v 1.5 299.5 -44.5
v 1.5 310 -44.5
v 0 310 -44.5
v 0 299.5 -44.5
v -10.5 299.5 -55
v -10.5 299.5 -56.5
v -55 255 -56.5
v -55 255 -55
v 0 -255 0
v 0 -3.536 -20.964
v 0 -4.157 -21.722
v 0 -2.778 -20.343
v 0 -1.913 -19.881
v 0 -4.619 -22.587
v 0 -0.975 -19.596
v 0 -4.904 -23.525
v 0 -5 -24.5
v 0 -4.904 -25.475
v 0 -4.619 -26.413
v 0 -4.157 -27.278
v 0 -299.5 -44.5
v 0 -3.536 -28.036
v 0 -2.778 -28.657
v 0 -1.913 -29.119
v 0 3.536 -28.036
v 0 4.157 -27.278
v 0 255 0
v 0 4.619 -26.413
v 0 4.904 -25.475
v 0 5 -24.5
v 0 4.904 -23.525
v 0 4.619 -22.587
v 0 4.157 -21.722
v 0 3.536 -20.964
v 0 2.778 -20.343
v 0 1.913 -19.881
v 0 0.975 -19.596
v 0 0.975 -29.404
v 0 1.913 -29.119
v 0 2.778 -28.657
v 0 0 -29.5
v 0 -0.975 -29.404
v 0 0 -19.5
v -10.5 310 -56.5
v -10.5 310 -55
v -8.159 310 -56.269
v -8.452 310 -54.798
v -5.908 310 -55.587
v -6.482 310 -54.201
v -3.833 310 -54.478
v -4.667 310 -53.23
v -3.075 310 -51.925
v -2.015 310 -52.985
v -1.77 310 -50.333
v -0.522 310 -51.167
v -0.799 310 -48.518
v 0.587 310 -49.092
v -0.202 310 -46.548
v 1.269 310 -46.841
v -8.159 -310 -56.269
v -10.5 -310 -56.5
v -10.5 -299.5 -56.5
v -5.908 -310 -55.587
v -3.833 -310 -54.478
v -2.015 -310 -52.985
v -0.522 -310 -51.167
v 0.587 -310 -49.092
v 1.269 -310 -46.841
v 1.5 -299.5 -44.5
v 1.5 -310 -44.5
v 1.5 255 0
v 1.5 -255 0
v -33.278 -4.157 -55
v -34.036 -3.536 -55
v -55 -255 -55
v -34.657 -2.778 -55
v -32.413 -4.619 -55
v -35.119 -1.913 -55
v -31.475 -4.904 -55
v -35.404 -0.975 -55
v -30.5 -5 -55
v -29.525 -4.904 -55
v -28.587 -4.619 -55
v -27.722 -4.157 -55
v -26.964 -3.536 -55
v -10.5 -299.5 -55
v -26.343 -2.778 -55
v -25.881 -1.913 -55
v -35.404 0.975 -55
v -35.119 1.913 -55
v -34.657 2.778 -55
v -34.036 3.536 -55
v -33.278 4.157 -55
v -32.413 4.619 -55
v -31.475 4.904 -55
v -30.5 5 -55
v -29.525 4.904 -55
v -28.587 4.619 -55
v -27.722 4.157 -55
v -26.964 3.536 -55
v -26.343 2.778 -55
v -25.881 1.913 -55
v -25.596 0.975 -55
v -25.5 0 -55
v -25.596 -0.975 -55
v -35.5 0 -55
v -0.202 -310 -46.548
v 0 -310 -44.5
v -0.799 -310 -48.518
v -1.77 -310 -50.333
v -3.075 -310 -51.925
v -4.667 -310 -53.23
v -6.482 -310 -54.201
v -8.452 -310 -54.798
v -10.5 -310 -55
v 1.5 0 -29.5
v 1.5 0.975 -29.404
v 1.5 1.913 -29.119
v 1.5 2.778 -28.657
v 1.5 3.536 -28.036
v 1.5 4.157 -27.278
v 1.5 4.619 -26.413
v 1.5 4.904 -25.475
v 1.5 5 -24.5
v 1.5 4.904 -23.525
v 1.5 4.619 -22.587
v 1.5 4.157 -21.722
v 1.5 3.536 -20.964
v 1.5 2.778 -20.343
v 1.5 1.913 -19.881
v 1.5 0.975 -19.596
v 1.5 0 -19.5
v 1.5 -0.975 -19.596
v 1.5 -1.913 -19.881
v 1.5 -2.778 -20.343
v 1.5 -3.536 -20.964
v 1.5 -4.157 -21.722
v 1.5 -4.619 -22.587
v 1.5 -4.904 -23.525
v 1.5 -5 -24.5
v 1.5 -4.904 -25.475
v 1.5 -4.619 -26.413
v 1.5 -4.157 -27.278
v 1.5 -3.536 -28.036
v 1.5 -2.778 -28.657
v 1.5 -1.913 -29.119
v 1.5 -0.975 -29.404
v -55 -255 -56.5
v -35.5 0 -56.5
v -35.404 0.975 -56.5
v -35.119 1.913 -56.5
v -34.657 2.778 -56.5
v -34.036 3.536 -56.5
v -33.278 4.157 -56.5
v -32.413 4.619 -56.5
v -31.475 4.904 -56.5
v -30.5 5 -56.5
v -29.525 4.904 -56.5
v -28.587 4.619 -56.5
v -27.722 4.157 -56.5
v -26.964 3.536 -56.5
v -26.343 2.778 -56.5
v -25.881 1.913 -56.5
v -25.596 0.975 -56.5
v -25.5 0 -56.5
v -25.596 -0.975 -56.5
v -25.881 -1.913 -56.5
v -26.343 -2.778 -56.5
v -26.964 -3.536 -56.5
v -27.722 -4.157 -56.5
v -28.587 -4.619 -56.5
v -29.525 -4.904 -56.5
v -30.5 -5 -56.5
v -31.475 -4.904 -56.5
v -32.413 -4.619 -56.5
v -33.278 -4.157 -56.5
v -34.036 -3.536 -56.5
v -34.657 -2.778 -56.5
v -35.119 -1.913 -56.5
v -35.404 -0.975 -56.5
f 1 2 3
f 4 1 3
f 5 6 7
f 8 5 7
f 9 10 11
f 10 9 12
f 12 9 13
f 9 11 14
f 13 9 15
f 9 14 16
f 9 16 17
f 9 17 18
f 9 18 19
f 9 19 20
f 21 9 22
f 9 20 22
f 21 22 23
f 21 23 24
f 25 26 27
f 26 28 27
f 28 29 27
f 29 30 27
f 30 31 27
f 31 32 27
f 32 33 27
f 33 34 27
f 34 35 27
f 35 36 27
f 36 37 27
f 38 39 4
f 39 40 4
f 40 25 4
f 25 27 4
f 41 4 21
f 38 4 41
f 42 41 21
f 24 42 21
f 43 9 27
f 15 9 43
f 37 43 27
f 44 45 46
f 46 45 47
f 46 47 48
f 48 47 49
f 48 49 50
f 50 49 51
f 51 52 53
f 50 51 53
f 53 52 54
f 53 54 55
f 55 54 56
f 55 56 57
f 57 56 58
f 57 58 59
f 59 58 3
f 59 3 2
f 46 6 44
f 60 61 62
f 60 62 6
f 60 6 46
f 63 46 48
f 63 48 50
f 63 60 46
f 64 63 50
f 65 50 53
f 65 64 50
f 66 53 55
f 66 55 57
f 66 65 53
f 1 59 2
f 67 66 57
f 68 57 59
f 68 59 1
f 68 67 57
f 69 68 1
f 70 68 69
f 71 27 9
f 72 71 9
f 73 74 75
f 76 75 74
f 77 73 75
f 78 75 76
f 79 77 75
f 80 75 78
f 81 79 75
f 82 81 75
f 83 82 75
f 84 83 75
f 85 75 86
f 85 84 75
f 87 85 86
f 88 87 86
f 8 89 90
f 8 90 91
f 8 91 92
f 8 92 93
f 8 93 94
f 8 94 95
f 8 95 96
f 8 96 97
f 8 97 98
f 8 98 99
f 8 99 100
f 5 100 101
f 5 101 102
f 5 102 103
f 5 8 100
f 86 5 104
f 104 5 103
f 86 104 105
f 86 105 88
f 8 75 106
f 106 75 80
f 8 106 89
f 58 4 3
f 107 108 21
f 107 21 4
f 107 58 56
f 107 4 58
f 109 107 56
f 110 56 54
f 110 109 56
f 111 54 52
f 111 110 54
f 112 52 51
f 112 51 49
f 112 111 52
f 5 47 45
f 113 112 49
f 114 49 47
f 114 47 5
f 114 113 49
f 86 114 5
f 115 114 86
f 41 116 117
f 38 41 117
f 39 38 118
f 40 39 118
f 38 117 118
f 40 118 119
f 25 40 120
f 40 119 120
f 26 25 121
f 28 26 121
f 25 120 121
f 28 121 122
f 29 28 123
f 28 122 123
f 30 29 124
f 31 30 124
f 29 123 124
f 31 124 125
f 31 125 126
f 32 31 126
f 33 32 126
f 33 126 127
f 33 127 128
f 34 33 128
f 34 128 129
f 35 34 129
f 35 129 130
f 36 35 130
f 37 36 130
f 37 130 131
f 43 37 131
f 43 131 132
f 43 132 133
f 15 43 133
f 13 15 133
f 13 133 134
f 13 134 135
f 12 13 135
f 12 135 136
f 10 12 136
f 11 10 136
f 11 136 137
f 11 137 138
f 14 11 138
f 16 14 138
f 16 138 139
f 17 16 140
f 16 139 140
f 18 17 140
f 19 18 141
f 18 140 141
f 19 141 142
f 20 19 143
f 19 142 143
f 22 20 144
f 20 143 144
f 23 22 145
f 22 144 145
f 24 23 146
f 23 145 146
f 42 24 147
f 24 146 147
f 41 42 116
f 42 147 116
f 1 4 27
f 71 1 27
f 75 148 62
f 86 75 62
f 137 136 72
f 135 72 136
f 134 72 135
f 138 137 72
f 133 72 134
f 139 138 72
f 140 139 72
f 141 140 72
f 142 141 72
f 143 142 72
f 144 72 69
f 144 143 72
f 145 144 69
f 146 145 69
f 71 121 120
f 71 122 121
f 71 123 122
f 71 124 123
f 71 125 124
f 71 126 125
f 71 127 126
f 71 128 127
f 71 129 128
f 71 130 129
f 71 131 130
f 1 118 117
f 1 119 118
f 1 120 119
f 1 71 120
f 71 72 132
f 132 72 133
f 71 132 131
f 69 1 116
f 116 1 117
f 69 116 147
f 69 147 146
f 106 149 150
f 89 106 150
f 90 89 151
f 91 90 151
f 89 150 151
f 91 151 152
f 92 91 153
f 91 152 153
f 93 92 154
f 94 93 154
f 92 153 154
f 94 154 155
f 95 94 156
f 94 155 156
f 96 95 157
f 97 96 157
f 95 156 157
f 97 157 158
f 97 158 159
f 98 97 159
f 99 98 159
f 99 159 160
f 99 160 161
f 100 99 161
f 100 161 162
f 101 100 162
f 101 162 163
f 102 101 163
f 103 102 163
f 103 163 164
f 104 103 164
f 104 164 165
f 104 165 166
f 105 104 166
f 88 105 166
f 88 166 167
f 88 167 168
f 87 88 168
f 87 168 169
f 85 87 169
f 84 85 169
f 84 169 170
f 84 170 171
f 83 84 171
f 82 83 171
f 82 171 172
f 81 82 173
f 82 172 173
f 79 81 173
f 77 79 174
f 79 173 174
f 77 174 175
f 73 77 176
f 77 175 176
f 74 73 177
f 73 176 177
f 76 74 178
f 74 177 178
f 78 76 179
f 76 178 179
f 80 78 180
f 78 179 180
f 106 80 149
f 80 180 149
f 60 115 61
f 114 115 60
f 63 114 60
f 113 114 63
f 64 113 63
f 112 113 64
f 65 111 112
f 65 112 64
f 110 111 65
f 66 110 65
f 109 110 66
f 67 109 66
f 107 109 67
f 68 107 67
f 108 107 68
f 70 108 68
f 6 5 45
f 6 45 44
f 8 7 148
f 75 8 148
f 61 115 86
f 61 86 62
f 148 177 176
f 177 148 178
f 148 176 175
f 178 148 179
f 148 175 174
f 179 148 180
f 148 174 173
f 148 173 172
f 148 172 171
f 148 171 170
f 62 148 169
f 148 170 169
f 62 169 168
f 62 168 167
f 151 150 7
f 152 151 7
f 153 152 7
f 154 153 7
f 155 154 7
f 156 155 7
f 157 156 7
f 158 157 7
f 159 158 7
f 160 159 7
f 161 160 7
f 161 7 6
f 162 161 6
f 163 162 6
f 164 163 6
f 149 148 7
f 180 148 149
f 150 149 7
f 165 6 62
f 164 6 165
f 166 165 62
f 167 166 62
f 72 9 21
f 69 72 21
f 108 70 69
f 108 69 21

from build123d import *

# Parameters (mm, degrees)
SKETCH1_W               = 1.5
SKETCH1_H               = 620
BOSS_EXTRUDE1_DEPTH     = 1.5
BOSS_EXTRUDE3_DEPTH     = 1.5
SKETCH5_W               = 1.5
SKETCH5_H               = 1.5
CUT_EXTRUDE1_DEPTH      = 1
CUT_EXTRUDE1_DEPTH_BACK = 621
BOSS_EXTRUDE4_DEPTH     = 620
SKETCH6_R               = 5
CUT_EXTRUDE2_DEPTH      = 1
CUT_EXTRUDE2_DEPTH_BACK = 57.5
SKETCH7_R               = 5
CUT_EXTRUDE3_DEPTH      = 1
CUT_EXTRUDE3_DEPTH_BACK = 57.5


with BuildPart() as part:
    # Sketch1 → Boss-Extrude1 (new body)
    with BuildSketch(Plane(origin=(0, 0, 0), x_dir=(0, 0, -1), z_dir=(1, 0, 0))):
        Polygon((0, 255), (0, -255), (55, -310), (55, 310), align=None)
        with Locations((55.75, 0)):
            Rectangle(SKETCH1_W, SKETCH1_H)
    extrude(amount=BOSS_EXTRUDE1_DEPTH)

    # Sketch2 → Boss-Extrude3 (add)
    with BuildSketch(Plane(origin=(0, 0, -56.5), x_dir=(-1, 0, 0), z_dir=(0, 0, -1))):
        Polygon((55, 255), (55, -255), (0, -310), (0, 310), align=None)
    extrude(amount=-BOSS_EXTRUDE3_DEPTH)

    # Sketch5 → Cut-Extrude1 (cut, two sides)
    with BuildSketch(Plane.XZ.offset(310)) as cut_extrude1_sk:
        with BuildLine():
            ThreePointArc((1.5, -44.5), (-2.014718626, -52.985281374), (-10.5, -56.5))
            Line((-10.5, -56.5), (0, -56.5))
            Line((0, -56.5), (0, -55))
            Line((0, -55), (1.5, -55))
            Line((1.5, -55), (1.5, -44.5))
        make_face()
        with Locations((0.75, -55.75)):
            Rectangle(SKETCH5_W, SKETCH5_H)
    extrude(amount=CUT_EXTRUDE1_DEPTH, mode=Mode.SUBTRACT)
    extrude(cut_extrude1_sk.sketch, amount=-CUT_EXTRUDE1_DEPTH_BACK, mode=Mode.SUBTRACT)

    # Sketch5<3> → Boss-Extrude4 (add)
    with BuildSketch(Plane.XZ.offset(310)):
        with BuildLine():
            Line((-10.5, -55), (-10.5, -56.5))
            ThreePointArc((-10.5, -56.5), (-2.014718626, -52.985281374), (1.5, -44.5))
            Line((1.5, -44.5), (0, -44.5))
            ThreePointArc((0, -44.5), (-3.075378798, -51.924621202), (-10.5, -55))
        make_face()
    extrude(amount=-BOSS_EXTRUDE4_DEPTH)

    # Sketch6 → Cut-Extrude2 (cut, two sides)
    with BuildSketch(Plane(origin=(1.5, 0, 0), x_dir=(0, 0, -1), z_dir=(1, 0, 0))) as cut_extrude2_sk:
        with Locations((24.5, 0)):
            Circle(SKETCH6_R)
    extrude(amount=CUT_EXTRUDE2_DEPTH, mode=Mode.SUBTRACT)
    extrude(cut_extrude2_sk.sketch, amount=-CUT_EXTRUDE2_DEPTH_BACK, mode=Mode.SUBTRACT)

    # Sketch7 → Cut-Extrude3 (cut, two sides)
    with BuildSketch(Plane(origin=(0, 0, -56.5), x_dir=(-1, 0, 0), z_dir=(0, 0, -1))) as cut_extrude3_sk:
        with Locations((30.5, 0)):
            Circle(SKETCH7_R)
    extrude(amount=CUT_EXTRUDE3_DEPTH, mode=Mode.SUBTRACT)
    extrude(cut_extrude3_sk.sketch, amount=-CUT_EXTRUDE3_DEPTH_BACK, mode=Mode.SUBTRACT)


solid = part.part
